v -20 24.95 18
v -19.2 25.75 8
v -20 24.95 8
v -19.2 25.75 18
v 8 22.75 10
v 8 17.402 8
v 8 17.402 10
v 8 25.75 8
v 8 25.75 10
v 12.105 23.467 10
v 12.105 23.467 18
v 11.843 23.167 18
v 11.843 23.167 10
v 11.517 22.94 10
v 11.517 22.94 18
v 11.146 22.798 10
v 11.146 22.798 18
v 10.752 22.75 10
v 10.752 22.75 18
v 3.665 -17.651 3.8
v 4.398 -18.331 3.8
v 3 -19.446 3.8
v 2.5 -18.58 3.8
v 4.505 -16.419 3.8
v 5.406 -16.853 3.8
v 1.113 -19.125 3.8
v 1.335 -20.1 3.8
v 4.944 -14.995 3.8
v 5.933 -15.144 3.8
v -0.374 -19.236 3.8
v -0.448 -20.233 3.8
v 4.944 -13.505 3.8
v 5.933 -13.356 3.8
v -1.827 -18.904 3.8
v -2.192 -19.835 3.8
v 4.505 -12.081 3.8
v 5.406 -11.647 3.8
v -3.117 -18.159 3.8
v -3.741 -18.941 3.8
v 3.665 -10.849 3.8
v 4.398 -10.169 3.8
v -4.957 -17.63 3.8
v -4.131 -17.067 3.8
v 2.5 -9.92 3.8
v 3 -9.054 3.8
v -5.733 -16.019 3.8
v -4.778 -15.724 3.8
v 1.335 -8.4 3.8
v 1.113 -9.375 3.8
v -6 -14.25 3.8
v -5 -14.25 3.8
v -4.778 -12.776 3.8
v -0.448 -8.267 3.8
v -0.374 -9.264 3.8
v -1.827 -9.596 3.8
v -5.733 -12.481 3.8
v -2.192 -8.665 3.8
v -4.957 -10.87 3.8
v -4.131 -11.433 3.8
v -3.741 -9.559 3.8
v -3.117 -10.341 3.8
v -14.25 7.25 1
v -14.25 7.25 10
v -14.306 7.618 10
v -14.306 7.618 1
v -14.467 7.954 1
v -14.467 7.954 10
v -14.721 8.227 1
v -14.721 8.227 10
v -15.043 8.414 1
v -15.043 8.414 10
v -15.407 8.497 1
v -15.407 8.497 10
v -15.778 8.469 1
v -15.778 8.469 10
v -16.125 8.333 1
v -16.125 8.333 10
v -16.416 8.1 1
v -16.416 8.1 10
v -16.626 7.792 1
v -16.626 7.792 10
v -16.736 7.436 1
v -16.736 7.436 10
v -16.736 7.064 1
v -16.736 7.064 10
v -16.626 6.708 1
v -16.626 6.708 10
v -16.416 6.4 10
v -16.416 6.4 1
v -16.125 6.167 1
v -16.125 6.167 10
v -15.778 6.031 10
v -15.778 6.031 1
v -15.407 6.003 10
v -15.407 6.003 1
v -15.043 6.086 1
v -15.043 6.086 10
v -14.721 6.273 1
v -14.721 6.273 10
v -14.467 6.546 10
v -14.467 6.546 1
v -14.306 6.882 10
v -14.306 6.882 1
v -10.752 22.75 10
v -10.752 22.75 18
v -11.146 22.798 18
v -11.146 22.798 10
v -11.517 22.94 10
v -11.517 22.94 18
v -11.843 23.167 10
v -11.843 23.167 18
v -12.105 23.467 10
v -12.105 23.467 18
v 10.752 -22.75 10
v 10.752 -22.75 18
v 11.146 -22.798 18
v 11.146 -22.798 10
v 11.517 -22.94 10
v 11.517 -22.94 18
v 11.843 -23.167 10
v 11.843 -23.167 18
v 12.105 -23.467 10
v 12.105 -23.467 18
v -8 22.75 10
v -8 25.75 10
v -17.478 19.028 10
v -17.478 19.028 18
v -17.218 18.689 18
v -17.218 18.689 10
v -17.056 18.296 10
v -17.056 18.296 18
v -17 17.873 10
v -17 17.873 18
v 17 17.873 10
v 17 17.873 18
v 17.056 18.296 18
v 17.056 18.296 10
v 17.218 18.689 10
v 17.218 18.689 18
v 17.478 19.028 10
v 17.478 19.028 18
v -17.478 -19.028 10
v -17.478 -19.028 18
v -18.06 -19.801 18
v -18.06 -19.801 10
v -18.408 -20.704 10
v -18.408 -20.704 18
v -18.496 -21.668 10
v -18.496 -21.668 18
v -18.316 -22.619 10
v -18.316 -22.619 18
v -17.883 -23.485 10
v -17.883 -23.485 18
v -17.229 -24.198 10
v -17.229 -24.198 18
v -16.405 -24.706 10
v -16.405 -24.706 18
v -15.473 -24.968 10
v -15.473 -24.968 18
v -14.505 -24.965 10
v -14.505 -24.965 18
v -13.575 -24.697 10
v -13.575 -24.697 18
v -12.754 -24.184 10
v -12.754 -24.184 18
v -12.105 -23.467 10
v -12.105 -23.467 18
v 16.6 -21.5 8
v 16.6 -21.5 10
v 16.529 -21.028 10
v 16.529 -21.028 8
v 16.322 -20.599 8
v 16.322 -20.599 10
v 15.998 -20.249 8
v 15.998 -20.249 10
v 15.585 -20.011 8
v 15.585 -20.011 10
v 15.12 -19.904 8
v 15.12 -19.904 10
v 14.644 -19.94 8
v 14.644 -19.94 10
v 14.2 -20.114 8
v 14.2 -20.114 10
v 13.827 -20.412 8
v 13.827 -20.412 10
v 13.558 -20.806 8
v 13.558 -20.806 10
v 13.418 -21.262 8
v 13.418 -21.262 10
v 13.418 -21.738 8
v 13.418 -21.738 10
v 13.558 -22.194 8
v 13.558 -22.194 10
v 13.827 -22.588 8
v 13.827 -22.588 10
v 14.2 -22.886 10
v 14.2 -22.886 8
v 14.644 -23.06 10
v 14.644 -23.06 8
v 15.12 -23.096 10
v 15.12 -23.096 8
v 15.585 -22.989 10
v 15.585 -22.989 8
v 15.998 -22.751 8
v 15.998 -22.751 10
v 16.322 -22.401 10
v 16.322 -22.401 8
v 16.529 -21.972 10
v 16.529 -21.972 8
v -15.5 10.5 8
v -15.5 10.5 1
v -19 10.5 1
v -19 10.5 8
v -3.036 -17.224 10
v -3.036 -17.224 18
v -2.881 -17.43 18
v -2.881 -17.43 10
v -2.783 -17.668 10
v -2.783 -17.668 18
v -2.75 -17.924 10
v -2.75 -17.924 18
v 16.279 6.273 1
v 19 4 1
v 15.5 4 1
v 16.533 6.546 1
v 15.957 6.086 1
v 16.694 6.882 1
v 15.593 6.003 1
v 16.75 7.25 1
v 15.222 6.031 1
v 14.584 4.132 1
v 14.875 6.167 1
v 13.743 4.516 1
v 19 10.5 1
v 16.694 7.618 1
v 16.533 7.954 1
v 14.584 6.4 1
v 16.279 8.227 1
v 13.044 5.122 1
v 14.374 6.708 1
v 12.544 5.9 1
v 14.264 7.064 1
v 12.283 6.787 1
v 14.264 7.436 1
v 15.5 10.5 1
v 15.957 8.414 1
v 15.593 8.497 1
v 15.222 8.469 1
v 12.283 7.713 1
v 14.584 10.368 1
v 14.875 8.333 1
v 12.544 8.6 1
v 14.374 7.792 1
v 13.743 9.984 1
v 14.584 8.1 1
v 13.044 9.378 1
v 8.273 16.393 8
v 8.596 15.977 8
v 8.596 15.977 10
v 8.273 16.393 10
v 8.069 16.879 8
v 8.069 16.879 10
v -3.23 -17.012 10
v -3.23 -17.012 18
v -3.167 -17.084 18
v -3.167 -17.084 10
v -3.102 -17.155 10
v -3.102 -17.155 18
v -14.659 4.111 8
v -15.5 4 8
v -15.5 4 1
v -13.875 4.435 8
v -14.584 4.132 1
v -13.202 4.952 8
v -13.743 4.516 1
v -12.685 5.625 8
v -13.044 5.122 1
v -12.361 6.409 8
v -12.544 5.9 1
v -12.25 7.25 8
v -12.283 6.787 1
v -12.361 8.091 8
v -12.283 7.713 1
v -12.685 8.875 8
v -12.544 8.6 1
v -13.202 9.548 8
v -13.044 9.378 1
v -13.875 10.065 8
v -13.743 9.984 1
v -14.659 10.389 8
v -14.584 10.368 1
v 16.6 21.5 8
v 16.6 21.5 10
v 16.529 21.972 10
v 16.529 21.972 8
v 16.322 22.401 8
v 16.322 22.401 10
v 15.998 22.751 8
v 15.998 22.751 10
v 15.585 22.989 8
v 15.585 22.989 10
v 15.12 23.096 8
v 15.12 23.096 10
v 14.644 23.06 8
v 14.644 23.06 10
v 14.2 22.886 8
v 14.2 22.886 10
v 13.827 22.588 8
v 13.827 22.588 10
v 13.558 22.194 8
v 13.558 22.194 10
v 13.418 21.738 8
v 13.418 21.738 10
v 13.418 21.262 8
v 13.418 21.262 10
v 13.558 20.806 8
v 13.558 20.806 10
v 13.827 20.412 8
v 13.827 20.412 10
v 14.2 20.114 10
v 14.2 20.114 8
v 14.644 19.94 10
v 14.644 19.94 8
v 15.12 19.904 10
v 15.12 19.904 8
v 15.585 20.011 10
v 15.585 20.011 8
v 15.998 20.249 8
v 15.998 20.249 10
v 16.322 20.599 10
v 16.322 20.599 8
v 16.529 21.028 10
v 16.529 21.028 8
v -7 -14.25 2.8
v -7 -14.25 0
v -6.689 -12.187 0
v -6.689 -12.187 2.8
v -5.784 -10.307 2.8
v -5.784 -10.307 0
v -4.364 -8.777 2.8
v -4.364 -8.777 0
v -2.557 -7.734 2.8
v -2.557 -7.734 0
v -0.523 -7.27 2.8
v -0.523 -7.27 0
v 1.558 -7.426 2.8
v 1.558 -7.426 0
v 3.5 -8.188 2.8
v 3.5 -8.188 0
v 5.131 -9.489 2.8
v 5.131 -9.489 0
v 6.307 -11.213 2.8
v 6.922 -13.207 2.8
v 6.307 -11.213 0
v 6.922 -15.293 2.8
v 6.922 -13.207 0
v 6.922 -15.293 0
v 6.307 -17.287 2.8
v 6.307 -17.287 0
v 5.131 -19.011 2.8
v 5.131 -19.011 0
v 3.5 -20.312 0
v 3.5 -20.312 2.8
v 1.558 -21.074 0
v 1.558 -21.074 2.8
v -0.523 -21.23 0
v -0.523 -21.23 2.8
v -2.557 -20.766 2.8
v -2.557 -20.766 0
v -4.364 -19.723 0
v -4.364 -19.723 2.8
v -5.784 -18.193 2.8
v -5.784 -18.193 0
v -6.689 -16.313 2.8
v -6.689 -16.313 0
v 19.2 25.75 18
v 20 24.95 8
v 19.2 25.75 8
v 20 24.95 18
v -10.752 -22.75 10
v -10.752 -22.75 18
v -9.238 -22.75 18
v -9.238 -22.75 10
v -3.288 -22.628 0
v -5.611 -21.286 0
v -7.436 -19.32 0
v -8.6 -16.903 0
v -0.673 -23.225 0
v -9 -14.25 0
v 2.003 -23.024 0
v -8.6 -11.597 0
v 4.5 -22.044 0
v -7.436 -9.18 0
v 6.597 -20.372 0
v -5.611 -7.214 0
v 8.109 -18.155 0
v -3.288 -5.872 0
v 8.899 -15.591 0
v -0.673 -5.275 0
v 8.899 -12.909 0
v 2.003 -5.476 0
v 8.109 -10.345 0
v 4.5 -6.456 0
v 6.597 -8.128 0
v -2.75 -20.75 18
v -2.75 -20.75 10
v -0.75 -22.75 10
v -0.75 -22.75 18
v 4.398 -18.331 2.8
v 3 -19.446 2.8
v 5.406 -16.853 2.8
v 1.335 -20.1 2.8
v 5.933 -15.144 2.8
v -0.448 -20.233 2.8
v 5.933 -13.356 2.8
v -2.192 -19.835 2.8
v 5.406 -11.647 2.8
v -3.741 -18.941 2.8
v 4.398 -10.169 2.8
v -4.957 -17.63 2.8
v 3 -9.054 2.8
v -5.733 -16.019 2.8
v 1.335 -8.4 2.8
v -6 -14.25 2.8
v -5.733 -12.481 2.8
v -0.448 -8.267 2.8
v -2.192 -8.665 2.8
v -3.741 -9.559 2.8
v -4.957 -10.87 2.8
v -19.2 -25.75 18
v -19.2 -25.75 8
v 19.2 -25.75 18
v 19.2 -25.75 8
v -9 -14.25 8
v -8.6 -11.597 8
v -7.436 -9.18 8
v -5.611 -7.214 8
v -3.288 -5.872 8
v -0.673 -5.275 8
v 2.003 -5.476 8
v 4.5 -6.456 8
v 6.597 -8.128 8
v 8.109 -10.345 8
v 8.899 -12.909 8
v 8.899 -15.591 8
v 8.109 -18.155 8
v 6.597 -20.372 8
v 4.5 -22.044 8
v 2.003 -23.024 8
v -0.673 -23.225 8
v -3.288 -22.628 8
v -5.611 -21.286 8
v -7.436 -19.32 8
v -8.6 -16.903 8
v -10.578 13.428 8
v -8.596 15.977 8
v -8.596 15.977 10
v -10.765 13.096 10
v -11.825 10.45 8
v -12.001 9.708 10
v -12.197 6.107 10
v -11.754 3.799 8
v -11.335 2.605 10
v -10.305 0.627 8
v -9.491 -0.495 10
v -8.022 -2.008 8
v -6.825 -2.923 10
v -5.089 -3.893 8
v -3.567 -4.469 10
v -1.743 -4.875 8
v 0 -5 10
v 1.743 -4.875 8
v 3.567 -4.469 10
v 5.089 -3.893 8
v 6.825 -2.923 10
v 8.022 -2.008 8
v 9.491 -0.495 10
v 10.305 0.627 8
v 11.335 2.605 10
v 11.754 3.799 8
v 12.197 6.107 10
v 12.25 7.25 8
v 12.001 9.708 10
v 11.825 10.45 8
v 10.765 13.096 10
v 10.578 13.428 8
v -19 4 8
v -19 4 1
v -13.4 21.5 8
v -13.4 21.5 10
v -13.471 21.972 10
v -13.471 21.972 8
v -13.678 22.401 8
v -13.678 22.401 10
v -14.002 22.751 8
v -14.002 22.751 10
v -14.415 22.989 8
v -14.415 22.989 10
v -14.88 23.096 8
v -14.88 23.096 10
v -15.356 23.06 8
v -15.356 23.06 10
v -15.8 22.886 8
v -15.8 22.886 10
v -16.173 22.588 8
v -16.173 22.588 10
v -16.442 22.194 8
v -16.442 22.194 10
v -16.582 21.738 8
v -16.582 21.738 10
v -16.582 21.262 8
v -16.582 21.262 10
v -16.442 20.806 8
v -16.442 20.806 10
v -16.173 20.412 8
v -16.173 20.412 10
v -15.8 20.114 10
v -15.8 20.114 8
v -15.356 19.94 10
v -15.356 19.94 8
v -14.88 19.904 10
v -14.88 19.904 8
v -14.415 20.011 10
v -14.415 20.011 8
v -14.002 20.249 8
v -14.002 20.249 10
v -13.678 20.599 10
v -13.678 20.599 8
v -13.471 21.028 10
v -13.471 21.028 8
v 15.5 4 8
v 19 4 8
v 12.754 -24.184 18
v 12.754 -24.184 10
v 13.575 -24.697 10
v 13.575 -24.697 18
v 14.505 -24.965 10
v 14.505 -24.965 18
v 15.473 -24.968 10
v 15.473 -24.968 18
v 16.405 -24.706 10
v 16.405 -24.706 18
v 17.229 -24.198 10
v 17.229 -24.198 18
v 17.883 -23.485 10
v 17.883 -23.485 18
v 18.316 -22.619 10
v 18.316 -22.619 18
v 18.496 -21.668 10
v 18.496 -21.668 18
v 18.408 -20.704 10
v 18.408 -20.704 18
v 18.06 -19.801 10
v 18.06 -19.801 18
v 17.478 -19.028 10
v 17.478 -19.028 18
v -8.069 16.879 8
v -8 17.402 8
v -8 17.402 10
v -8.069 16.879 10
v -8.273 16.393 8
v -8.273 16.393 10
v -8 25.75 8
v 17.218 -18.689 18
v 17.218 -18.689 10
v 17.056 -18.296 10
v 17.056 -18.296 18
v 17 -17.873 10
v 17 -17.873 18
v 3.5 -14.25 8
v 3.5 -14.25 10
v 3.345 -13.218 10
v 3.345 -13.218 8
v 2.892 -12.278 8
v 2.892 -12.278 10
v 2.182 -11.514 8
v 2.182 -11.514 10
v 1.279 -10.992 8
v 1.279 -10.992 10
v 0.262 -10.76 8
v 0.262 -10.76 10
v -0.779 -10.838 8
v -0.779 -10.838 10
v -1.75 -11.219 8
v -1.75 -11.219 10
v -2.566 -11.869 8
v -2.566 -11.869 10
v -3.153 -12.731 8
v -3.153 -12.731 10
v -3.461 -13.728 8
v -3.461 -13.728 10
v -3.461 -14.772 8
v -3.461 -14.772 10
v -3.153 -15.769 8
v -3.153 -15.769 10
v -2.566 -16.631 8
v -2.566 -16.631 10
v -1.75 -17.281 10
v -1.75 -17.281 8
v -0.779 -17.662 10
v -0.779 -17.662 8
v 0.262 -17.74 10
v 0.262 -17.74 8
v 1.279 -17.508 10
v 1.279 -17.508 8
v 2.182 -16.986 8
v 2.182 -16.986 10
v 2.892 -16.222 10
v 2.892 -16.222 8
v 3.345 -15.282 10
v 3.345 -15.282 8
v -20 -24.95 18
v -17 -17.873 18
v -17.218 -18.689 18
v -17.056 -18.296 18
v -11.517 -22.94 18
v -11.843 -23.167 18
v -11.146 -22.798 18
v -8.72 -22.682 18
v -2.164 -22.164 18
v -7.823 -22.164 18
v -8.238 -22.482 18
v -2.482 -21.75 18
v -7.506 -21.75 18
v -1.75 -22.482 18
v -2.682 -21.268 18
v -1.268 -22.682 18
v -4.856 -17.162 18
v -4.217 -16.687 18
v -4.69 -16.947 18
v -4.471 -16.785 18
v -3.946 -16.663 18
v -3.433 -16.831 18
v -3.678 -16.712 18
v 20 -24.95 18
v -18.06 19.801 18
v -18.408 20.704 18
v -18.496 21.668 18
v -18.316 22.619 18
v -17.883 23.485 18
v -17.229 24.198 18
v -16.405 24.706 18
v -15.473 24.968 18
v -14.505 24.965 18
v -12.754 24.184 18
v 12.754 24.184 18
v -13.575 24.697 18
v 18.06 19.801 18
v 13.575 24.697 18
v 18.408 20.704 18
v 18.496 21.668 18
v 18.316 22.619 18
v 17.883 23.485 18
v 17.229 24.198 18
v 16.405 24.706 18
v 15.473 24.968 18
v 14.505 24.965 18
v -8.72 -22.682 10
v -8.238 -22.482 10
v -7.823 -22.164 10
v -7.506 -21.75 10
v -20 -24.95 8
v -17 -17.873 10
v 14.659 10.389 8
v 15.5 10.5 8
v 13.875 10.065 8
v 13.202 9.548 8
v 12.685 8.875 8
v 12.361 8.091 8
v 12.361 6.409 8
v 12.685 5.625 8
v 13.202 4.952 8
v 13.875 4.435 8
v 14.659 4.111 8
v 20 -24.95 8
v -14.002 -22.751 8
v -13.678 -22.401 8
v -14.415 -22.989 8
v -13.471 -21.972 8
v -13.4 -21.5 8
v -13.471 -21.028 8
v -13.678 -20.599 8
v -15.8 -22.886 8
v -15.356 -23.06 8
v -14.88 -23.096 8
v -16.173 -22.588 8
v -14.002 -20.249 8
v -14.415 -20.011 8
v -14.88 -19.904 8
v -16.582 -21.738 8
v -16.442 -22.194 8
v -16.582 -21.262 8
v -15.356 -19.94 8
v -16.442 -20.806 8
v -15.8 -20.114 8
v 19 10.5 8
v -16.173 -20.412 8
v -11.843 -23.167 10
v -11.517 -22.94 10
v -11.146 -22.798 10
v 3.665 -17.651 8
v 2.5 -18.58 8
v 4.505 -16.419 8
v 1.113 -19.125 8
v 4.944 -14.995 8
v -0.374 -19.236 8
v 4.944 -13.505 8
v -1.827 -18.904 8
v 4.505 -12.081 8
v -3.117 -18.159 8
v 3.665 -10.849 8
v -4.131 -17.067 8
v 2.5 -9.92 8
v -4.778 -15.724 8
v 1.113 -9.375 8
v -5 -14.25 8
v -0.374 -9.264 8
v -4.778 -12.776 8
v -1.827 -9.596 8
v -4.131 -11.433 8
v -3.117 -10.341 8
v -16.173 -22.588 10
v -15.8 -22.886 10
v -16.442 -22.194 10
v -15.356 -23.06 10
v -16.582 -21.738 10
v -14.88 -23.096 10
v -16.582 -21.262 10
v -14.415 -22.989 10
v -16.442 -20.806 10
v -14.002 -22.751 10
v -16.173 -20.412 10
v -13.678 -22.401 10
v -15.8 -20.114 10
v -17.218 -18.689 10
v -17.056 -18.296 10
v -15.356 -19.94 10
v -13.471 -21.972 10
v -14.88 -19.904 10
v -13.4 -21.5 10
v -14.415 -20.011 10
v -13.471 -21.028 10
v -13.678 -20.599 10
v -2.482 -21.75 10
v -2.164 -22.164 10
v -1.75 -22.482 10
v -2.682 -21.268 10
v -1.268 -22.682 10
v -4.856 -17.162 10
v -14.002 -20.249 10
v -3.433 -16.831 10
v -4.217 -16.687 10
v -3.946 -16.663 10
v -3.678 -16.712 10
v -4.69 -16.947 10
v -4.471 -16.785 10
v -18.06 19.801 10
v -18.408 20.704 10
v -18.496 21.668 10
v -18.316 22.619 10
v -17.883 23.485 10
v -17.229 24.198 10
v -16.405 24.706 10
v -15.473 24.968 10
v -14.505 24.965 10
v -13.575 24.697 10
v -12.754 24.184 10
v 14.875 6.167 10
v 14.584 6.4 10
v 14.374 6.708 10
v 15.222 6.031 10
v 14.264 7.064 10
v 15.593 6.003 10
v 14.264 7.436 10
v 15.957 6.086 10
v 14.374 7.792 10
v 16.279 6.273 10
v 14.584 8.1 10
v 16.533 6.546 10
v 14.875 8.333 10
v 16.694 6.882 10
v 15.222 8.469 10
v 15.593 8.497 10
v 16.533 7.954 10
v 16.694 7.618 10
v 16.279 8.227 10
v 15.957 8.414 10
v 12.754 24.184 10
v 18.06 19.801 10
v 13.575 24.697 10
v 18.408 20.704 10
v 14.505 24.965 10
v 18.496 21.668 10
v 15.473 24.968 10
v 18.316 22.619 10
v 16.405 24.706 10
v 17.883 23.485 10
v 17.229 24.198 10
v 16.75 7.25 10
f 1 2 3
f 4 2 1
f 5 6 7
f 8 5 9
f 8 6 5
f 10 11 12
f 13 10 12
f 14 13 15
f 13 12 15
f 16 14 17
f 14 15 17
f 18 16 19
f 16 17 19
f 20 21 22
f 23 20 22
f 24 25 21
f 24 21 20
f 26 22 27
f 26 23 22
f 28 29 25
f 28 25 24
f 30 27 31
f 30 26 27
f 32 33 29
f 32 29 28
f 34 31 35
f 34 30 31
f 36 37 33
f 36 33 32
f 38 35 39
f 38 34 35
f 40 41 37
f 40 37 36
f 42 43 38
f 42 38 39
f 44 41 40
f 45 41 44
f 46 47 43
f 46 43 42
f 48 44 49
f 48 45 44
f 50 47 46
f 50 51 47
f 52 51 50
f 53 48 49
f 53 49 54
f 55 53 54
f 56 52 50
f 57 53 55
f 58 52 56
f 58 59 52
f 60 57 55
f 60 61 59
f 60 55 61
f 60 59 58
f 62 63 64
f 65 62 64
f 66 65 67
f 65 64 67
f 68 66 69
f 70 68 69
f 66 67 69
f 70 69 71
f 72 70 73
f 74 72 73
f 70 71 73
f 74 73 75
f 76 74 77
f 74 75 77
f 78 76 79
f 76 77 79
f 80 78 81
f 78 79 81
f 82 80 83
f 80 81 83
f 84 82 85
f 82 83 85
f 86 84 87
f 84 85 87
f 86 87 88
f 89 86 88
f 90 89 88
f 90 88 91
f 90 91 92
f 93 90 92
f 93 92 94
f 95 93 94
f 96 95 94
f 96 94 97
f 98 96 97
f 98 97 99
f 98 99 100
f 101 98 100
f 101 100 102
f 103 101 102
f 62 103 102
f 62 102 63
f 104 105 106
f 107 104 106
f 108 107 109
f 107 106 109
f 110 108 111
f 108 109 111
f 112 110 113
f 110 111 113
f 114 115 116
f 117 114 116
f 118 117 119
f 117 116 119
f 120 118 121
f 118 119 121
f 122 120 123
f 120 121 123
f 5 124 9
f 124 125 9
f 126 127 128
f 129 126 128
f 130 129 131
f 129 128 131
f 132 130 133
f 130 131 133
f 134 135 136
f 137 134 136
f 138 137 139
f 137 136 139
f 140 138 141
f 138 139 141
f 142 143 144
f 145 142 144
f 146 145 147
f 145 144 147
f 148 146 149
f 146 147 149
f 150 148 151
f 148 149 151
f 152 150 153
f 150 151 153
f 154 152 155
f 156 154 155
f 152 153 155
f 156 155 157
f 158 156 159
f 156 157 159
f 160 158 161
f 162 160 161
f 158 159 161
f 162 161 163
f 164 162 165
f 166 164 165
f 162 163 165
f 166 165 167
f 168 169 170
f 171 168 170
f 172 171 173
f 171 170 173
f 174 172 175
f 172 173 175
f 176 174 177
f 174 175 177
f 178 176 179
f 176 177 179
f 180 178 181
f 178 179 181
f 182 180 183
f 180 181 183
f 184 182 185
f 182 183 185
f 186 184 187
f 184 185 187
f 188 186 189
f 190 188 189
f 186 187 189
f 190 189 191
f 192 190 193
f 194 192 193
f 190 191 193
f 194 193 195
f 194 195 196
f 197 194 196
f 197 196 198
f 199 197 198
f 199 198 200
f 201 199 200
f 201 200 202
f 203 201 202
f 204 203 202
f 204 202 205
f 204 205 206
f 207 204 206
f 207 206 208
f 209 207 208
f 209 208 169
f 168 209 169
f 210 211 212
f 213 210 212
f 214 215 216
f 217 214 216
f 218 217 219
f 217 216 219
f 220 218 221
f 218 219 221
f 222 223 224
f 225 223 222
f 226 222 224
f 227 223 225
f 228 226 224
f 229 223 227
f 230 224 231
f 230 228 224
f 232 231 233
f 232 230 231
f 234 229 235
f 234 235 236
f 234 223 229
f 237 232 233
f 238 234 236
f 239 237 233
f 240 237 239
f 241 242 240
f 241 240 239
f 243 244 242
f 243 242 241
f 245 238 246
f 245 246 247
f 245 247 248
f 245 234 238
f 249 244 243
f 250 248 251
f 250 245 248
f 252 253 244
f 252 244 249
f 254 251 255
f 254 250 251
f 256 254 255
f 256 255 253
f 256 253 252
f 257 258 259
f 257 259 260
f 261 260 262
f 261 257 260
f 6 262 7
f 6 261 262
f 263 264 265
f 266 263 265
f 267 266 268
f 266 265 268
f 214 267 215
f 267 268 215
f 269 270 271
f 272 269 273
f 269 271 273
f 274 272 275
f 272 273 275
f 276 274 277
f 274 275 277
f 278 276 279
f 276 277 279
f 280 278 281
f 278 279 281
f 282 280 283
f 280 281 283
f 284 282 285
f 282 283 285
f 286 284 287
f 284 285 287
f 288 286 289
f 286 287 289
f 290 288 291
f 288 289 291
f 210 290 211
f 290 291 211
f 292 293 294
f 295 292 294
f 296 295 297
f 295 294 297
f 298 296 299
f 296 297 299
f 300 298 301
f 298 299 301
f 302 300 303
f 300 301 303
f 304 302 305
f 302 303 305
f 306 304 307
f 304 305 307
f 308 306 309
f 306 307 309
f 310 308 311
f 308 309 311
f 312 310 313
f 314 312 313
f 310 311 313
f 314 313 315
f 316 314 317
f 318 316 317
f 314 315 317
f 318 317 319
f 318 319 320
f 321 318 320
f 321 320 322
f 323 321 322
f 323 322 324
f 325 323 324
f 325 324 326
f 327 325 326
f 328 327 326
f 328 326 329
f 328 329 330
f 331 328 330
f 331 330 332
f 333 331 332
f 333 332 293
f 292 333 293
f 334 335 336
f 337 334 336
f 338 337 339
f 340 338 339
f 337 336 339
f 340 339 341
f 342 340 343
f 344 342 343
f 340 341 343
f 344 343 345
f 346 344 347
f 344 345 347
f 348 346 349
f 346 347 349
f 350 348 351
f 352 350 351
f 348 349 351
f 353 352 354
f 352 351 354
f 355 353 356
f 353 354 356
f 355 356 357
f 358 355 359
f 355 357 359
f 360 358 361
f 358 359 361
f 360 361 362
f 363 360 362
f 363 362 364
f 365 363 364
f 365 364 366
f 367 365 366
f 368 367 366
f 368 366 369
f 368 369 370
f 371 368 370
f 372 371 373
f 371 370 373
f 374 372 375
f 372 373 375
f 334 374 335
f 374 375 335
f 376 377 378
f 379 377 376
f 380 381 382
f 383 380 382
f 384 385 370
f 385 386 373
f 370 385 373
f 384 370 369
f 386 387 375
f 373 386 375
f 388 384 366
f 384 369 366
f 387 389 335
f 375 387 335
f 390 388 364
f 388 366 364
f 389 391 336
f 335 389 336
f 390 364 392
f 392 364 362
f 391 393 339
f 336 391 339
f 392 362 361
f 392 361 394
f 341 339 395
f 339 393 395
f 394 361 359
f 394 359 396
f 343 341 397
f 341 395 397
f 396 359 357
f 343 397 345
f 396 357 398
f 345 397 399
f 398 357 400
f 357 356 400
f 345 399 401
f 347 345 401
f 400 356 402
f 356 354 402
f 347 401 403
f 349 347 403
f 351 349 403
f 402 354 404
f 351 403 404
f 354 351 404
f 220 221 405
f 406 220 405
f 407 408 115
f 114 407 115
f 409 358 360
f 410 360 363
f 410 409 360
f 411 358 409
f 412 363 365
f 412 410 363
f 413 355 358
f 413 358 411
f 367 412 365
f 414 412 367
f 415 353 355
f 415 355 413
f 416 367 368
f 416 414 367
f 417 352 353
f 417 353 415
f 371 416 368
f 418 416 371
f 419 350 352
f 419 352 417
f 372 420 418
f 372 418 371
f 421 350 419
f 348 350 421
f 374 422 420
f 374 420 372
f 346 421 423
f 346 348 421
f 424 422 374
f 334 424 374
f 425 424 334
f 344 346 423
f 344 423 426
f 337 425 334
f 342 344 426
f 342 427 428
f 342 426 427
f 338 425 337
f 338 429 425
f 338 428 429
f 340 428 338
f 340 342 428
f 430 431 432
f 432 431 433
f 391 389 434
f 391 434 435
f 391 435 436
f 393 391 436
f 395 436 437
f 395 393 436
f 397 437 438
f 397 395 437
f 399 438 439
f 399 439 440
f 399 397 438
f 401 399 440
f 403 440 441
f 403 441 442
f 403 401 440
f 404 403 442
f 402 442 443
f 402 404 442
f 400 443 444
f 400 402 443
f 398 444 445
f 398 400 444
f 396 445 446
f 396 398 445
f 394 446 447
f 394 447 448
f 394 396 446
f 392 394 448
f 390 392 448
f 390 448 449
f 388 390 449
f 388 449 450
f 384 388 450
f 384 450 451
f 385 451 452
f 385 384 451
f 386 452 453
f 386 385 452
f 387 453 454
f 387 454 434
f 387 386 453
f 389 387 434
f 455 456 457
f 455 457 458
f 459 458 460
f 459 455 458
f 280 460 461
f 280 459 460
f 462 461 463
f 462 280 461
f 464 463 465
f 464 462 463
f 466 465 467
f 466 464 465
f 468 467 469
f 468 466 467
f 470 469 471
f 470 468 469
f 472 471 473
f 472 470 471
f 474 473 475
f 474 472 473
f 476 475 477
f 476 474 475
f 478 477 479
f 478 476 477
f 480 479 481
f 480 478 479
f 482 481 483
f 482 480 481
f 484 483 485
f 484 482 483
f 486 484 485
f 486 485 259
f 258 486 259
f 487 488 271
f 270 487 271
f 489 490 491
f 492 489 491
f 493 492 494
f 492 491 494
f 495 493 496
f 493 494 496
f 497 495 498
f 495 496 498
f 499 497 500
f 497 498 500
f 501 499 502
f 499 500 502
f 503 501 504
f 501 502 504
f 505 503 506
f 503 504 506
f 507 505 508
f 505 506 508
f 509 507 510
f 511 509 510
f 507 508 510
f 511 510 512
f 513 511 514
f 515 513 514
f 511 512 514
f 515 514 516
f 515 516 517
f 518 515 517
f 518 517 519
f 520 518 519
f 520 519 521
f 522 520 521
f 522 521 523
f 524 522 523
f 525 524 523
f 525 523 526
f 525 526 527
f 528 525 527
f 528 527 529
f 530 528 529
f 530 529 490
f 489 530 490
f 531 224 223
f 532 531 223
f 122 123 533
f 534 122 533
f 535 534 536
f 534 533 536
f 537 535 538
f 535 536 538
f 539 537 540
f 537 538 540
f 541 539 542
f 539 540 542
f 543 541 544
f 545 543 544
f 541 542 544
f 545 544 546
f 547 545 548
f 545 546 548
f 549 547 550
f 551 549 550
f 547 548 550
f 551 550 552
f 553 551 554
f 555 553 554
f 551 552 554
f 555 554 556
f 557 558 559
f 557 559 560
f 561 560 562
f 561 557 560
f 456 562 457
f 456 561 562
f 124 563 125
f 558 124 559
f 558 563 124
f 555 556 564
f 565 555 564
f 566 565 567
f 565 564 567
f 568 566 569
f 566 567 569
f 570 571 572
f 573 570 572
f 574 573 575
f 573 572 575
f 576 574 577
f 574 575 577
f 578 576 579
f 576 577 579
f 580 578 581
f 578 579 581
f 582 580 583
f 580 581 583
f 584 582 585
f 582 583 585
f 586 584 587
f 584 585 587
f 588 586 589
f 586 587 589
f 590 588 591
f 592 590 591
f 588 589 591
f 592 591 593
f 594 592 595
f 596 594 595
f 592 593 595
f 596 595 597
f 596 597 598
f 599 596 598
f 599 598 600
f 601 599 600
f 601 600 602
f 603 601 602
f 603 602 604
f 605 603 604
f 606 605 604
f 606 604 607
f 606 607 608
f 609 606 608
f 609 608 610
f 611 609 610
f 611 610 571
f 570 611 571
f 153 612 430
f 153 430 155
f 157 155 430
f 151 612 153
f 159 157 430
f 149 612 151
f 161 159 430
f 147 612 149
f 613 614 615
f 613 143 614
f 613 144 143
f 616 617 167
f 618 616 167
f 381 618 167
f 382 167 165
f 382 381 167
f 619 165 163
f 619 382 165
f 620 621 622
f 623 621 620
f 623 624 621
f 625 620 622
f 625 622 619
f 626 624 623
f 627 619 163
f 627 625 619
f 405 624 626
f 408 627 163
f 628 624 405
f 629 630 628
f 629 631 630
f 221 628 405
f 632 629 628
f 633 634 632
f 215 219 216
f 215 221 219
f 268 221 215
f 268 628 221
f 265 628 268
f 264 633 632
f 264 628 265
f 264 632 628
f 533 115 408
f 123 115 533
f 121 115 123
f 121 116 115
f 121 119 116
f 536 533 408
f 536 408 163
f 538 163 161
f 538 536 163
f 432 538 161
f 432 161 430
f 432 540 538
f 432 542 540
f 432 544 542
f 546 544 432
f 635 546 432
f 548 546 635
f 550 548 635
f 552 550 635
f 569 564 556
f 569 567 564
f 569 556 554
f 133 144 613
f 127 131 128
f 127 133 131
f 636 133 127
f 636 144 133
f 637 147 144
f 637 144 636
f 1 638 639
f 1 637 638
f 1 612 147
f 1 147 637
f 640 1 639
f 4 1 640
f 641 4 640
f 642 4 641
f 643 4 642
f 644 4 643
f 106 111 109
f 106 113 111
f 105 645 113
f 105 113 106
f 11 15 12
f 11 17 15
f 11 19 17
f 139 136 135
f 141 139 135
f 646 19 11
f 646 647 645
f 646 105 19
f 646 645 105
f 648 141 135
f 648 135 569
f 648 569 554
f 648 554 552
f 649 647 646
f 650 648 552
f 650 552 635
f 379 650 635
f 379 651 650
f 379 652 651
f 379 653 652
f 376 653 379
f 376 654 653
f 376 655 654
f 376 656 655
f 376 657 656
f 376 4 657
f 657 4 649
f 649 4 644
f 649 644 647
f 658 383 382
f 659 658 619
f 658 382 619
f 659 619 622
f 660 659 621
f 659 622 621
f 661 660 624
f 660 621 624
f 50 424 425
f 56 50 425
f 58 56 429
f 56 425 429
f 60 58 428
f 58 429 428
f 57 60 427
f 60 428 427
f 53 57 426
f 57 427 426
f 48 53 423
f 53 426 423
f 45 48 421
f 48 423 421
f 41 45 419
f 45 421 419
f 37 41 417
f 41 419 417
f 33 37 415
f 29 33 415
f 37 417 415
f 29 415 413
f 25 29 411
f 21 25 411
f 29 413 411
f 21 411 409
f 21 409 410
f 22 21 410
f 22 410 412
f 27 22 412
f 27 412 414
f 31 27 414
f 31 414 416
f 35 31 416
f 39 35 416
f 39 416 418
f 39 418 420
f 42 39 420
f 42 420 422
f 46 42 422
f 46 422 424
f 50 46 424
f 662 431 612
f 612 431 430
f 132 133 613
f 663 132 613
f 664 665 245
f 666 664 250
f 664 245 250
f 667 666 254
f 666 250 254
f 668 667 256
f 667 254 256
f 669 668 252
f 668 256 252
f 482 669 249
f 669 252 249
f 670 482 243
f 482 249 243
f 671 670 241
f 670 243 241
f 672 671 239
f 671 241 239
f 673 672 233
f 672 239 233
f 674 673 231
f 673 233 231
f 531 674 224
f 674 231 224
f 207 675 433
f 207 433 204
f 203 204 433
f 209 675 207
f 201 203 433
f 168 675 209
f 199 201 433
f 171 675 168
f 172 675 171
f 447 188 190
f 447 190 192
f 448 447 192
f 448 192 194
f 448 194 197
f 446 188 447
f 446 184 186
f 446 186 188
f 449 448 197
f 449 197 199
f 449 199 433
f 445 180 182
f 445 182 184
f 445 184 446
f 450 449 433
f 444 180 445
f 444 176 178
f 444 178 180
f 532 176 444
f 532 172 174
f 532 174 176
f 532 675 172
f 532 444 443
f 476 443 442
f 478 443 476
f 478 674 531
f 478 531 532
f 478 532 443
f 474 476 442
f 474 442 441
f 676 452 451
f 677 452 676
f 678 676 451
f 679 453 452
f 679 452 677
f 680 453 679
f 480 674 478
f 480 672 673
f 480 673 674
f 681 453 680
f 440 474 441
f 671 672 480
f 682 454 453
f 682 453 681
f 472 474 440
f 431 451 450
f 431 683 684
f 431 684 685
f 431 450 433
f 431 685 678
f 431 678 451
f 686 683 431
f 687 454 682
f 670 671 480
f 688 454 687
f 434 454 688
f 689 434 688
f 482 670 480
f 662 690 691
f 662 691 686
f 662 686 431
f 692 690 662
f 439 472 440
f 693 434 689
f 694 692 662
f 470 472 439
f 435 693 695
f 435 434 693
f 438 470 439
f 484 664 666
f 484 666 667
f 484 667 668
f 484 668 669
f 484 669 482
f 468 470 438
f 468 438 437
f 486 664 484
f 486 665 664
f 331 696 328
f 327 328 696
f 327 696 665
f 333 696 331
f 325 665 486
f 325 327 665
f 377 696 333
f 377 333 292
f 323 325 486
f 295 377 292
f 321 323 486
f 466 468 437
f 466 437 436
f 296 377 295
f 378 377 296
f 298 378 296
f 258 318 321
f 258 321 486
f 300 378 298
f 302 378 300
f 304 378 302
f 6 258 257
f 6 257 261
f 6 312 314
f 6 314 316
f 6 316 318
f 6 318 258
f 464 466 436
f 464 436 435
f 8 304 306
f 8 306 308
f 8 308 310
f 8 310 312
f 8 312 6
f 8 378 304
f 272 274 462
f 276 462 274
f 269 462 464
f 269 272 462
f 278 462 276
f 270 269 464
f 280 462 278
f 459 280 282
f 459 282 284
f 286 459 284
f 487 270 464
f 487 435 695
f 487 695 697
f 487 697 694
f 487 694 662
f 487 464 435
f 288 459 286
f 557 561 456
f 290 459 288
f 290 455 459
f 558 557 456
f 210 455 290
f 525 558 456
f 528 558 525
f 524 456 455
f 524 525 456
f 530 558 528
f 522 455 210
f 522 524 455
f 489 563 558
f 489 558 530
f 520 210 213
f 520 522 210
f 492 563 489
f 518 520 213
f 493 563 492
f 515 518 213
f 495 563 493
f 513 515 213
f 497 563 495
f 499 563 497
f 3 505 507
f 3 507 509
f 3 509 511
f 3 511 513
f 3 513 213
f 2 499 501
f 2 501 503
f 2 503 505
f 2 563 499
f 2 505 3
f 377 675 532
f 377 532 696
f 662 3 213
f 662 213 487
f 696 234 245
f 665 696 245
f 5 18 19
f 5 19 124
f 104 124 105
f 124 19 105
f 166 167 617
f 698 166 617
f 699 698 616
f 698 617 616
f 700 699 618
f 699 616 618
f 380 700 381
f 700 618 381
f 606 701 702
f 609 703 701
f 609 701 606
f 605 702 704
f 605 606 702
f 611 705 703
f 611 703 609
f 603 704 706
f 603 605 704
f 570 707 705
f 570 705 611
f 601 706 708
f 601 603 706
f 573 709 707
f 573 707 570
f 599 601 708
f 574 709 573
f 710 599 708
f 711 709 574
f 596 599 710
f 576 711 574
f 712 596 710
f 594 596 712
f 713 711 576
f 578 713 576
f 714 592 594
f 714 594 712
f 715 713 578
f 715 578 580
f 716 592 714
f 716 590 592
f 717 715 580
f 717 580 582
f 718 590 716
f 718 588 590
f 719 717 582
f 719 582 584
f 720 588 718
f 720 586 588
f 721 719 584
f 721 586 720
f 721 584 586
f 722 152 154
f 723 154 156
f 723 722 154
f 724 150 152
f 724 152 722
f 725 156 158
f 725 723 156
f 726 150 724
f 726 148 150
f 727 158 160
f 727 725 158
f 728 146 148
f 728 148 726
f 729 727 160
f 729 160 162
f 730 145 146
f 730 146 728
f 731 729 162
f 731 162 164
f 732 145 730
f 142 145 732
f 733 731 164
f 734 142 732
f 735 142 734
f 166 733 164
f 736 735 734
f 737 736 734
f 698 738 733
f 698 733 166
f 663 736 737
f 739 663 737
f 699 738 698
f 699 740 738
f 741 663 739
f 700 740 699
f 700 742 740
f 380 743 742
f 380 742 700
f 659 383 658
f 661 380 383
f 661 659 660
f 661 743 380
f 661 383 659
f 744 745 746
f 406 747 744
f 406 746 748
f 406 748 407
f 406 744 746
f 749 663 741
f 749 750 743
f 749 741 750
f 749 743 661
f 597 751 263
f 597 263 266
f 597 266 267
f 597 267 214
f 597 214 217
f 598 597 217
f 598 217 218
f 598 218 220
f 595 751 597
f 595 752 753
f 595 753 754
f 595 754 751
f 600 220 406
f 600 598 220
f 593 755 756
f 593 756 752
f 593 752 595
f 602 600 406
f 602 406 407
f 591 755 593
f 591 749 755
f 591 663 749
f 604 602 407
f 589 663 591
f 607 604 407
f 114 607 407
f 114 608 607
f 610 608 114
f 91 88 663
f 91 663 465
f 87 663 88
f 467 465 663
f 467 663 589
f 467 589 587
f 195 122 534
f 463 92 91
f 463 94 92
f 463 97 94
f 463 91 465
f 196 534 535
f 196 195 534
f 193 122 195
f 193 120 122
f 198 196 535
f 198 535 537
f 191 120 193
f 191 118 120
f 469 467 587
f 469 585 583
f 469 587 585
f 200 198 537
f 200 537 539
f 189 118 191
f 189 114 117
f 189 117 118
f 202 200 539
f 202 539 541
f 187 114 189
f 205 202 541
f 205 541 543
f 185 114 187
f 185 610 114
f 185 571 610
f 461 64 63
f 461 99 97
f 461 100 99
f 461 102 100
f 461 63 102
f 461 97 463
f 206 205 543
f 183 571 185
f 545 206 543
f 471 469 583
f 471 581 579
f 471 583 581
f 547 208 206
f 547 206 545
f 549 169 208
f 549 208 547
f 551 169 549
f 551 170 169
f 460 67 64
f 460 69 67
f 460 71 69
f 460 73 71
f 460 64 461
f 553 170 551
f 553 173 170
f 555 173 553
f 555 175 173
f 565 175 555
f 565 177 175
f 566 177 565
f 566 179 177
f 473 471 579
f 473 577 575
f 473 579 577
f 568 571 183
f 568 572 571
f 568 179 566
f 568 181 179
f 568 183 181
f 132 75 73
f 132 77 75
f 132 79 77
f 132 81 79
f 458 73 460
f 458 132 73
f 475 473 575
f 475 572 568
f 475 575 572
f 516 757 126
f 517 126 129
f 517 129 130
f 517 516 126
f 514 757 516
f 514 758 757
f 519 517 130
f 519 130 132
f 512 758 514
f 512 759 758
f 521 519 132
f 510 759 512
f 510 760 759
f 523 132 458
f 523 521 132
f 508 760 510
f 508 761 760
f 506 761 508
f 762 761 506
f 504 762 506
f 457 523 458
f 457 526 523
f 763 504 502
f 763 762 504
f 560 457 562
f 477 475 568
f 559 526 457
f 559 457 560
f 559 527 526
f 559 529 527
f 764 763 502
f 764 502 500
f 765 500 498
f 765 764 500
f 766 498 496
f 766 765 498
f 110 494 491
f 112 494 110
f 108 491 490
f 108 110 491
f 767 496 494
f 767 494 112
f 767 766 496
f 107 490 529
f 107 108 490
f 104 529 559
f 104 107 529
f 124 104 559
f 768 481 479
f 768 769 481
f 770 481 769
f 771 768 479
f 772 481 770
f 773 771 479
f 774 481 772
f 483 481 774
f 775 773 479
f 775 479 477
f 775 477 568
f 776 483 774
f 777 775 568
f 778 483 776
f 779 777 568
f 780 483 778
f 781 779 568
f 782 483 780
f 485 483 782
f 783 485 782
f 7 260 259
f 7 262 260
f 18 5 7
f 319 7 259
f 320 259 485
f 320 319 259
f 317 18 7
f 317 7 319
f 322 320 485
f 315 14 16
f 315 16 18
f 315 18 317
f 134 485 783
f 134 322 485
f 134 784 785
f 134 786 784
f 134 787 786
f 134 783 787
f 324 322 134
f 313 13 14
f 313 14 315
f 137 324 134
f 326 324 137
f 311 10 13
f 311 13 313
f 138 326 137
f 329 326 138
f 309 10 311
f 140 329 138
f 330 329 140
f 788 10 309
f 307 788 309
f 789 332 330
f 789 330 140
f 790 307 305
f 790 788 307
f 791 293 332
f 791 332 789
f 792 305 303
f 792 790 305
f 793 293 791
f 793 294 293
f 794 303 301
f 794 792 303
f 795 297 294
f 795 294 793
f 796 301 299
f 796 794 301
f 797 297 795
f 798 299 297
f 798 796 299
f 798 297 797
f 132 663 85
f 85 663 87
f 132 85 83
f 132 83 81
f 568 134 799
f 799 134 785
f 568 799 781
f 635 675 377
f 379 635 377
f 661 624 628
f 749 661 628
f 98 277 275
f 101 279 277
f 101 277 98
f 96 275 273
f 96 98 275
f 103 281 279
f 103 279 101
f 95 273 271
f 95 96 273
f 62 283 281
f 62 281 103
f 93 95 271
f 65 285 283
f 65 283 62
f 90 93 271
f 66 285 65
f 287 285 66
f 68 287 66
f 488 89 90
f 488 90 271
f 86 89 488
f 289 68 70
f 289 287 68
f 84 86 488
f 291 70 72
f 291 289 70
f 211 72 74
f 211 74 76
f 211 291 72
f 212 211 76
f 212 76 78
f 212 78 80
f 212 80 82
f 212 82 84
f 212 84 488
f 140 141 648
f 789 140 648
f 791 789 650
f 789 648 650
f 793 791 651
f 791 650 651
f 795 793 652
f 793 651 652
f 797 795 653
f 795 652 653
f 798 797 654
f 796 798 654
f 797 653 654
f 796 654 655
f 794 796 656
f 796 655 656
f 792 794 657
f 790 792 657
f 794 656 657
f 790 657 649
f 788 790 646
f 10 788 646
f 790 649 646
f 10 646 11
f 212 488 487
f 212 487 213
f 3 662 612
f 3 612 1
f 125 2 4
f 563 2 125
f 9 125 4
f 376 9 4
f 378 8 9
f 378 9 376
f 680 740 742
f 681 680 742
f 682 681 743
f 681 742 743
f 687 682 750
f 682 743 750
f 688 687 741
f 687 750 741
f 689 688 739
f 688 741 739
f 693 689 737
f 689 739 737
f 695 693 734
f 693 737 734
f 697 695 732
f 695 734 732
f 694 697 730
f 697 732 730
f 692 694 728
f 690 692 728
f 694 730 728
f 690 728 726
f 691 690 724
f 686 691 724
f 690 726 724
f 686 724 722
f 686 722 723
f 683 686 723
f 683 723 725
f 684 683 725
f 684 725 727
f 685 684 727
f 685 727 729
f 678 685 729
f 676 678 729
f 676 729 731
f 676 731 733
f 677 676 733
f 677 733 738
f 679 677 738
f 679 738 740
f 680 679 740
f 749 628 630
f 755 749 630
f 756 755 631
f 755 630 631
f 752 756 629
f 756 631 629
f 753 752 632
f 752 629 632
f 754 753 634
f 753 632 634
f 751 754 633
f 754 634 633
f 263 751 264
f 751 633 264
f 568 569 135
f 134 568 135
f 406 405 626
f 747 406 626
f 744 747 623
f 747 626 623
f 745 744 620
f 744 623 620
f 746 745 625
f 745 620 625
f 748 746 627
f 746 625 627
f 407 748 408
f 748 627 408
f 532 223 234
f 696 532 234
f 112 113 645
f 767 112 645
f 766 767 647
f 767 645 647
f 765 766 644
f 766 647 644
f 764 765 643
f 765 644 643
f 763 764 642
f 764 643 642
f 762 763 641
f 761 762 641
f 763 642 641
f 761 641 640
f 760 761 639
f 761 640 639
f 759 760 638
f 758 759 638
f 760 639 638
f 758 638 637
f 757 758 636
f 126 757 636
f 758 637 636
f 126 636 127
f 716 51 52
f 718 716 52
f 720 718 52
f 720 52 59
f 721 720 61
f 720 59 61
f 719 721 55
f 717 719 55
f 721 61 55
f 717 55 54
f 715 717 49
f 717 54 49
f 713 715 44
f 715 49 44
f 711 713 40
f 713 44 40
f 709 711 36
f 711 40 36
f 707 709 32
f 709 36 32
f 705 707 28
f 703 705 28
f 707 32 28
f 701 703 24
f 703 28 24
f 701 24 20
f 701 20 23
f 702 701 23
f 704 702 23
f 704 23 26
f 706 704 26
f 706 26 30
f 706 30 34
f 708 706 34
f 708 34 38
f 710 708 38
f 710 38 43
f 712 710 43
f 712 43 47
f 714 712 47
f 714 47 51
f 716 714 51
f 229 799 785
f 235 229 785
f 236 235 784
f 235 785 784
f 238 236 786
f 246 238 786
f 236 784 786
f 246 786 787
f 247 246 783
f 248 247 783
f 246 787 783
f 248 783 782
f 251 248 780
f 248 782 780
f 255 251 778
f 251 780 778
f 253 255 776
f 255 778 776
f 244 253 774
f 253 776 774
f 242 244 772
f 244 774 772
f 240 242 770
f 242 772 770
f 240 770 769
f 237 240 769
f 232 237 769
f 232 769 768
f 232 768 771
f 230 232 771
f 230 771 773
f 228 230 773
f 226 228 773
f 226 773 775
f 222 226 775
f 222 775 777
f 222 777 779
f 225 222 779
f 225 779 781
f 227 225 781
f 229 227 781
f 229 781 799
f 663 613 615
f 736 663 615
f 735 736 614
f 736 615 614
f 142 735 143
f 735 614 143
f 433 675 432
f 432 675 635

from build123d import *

# Parameters (mm, degrees)
SKETCH1_W             = 40
SKETCH1_H             = 51.5
BOSS_EXTRUDE1_DEPTH   = 18
SKETCH3_R             = 1.6
CUT_EXTRUDE1_DEPTH    = 19
SKETCH4_R             = 3.5
CUT_EXTRUDE2_DEPTH    = 18
CUT_EXTRUDE3_DEPTH    = 8
SKETCH6_R             = 9
CUT_EXTRUDE4_DEPTH    = 8
SKETCH7_R             = 7
CUT_EXTRUDE5_DEPTH    = 2.8
SKETCH8_R             = 6
CUT_EXTRUDE6_DEPTH    = 3.8
SKETCH9_R             = 5
CUT_EXTRUDE7_DEPTH    = 8
M3X0_5_TAPPED_HOLE1_D = 2.5
CUT_EXTRUDE8_DEPTH    = 2
CUT_EXTRUDE9_DEPTH    = 1
CHAMFER1_SIZE         = 0.8
SKETCH14_W            = 1
SKETCH14_H            = 6.5
CUT_EXTRUDE10_DEPTH   = 7


with BuildPart() as part:
    # Sketch1 → Boss-Extrude1 (new body)
    with BuildSketch(Plane.XY):
        Rectangle(SKETCH1_W, SKETCH1_H)
    extrude(amount=BOSS_EXTRUDE1_DEPTH)

    # Sketch3 → Cut-Extrude1 (cut, through all)
    with BuildSketch(Plane.XY.offset(18)):
        with Locations((-15, 21.5)):
            Circle(SKETCH3_R)
        with Locations((-15, -21.5)):
            Circle(SKETCH3_R)
        with Locations((15, 21.5)):
            Circle(SKETCH3_R)
        with Locations((15, -21.5)):
            Circle(SKETCH3_R)
    extrude(amount=-CUT_EXTRUDE1_DEPTH, mode=Mode.SUBTRACT)

    # Sketch4 → Cut-Extrude2 (cut)
    with BuildSketch(Plane.XY.offset(18)):
        with Locations((0, -14.25)):
            Circle(SKETCH4_R)
    extrude(amount=-CUT_EXTRUDE2_DEPTH, mode=Mode.SUBTRACT)

    # Sketch5 → Cut-Extrude3 (cut)
    with BuildSketch(Plane.XY.offset(18)):
        with BuildLine():
            Line((-17, 17.872848693), (-17, -17.872848693))
            ThreePointArc((-17, -17.872848693), (-17.124132538, -18.49783351), (-17.477686074, -19.027941805))
            ThreePointArc((-17.477686074, -19.027941805), (-17.229095042, -24.198357888), (-12.104699799, -23.466529111))
            ThreePointArc((-12.104699799, -23.466529111), (-11.517289712, -22.940191537), (-10.751842764, -22.75))
            Line((-10.751842764, -22.75), (-9.2376, -22.75))
            ThreePointArc((-9.2376, -22.75), (-8.237593216, -22.482046891), (-7.50554136, -21.749986433))
            Line((-7.50554136, -21.749986433), (-4.85642932, -17.161506784))
            ThreePointArc((-4.85642932, -17.161506784), (-4.082002001, -16.665704301), (-3.230119897, -17.011904614))
            ThreePointArc((-3.230119897, -17.011904614), (-3.134851007, -17.11961684), (-3.035950666, -17.224004614))
            ThreePointArc((-3.035950666, -17.224004614), (-2.824243732, -17.545979208), (-2.75, -17.9241))
            Line((-2.75, -17.9241), (-2.75, -20.75))
            ThreePointArc((-2.75, -20.75), (-2.164213562, -22.164213562), (-0.75, -22.75))
            Line((-0.75, -22.75), (10.751842764, -22.75))
            ThreePointArc((10.751842764, -22.75), (11.517289712, -22.940191537), (12.104699799, -23.466529111))
            ThreePointArc((12.104699799, -23.466529111), (17.229095042, -24.198357888), (17.477686074, -19.027941805))
            ThreePointArc((17.477686074, -19.027941805), (17.124132538, -18.49783351), (17, -17.872848693))
            Line((17, -17.872848693), (17, 17.872848693))
            ThreePointArc((17, 17.872848693), (17.124132538, 18.49783351), (17.477686074, 19.027941805))
            ThreePointArc((17.477686074, 19.027941805), (17.229095042, 24.198357888), (12.104699799, 23.466529111))
            ThreePointArc((12.104699799, 23.466529111), (11.517289712, 22.940191537), (10.751842764, 22.75))
            Line((10.751842764, 22.75), (-10.751842764, 22.75))
            ThreePointArc((-10.751842764, 22.75), (-11.517289712, 22.940191537), (-12.104699799, 23.466529111))
            ThreePointArc((-12.104699799, 23.466529111), (-17.229095042, 24.198357888), (-17.477686074, 19.027941805))
            ThreePointArc((-17.477686074, 19.027941805), (-17.124132538, 18.49783351), (-17, 17.872848693))
        make_face()
    extrude(amount=-CUT_EXTRUDE3_DEPTH, mode=Mode.SUBTRACT)

    # Sketch6 → Cut-Extrude4 (cut)
    with BuildSketch(Plane(origin=(0, 0, 0), x_dir=(-1, 0, 0), z_dir=(0, 0, -1))):
        with BuildLine():
            Line((-20, 10.5), (-15.5, 10.5))
            ThreePointArc((-15.5, 10.5), (-12.25, 7.25), (-15.5, 4))
            Line((-15.5, 4), (-20, 4))
            Line((-20, 4), (-20, -25.75))
            Line((-20, -25.75), (20, -25.75))
            Line((20, -25.75), (20, 4))
            Line((20, 4), (15.5, 4))
            ThreePointArc((15.5, 4), (12.25, 7.25), (15.5, 10.5))
            Line((15.5, 10.5), (20, 10.5))
            Line((20, 10.5), (20, 25.75))
            Line((20, 25.75), (-20, 25.75))
            Line((-20, 25.75), (-20, 10.5))
        make_face()
        with Locations((0, -14.25)):
            Circle(SKETCH6_R, mode=Mode.SUBTRACT)
    extrude(amount=-CUT_EXTRUDE4_DEPTH, mode=Mode.SUBTRACT)

    # Sketch7 → Cut-Extrude5 (cut)
    with BuildSketch(Plane(origin=(0, 0, 0), x_dir=(-1, 0, 0), z_dir=(0, 0, -1))):
        with Locations((0, -14.25)):
            Circle(SKETCH7_R)
    extrude(amount=-CUT_EXTRUDE5_DEPTH, mode=Mode.SUBTRACT)

    # Sketch8 → Cut-Extrude6 (cut)
    with BuildSketch(Plane(origin=(0, 0, 0), x_dir=(-1, 0, 0), z_dir=(0, 0, -1))):
        with Locations((0, -14.25)):
            Circle(SKETCH8_R)
    extrude(amount=-CUT_EXTRUDE6_DEPTH, mode=Mode.SUBTRACT)

    # Sketch9 → Cut-Extrude7 (cut)
    with BuildSketch(Plane(origin=(0, 0, 0), x_dir=(-1, 0, 0), z_dir=(0, 0, -1))):
        with Locations((0, -14.25)):
            Circle(SKETCH9_R)
    extrude(amount=-CUT_EXTRUDE7_DEPTH, mode=Mode.SUBTRACT)

    # M3x0.5 Tapped Hole1 (through all)
    with Locations(Plane(origin=(0, 0, 0), x_dir=(-1, 0, 0), z_dir=(0, 0, -1))):
        with Locations((-15.5, 7.25), (15.5, 7.25)):
            Hole(M3X0_5_TAPPED_HOLE1_D / 2)

    # Sketch12 → Cut-Extrude8 (cut)
    with BuildSketch(Plane(origin=(0, 0, 8), x_dir=(-1, 0, 0), z_dir=(0, 0, -1))):
        with BuildLine():
            Line((-8, 17.401970252), (-8, 25.75))
            Line((-8, 25.75), (8, 25.75))
            Line((8, 25.75), (8, 17.401970252))
            ThreePointArc((8, 17.401970252), (8.155139905, 16.629641806), (8.596491228, 15.977132322))
            ThreePointArc((8.596491228, 15.977132322), (0, -5), (-8.596491228, 15.977132322))
            ThreePointArc((-8.596491228, 15.977132322), (-8.155139905, 16.629641806), (-8, 17.401970252))
        make_face()
    extrude(amount=-CUT_EXTRUDE8_DEPTH, mode=Mode.SUBTRACT)

    # Sketch13 → Cut-Extrude9 (cut)
    with BuildSketch(Plane(origin=(0, 0, 0), x_dir=(-1, 0, 0), z_dir=(0, 0, -1))):
        with BuildLine():
            Line((-20, 10.5), (-20, 4))
            Line((-20, 4), (-15.5, 4))
            ThreePointArc((-15.5, 4), (-12.25, 7.25), (-15.5, 10.5))
            Line((-15.5, 10.5), (-20, 10.5))
        make_face()
        with BuildLine():
            Line((20, 4), (20, 10.5))
            Line((20, 10.5), (15.5, 10.5))
            ThreePointArc((15.5, 10.5), (12.25, 7.25), (15.5, 4))
            Line((15.5, 4), (20, 4))
        make_face()
    extrude(amount=-CUT_EXTRUDE9_DEPTH, mode=Mode.SUBTRACT)

    # Chamfer1
    chamfer1_edges = [part.edges().sort_by_distance(p)[0] for p in [
        (20, -25.75, 13),
        (-20, -25.75, 13),
        (-20, 25.75, 13),
        (20, 25.75, 13),
    ]]
    chamfer(chamfer1_edges, length=CHAMFER1_SIZE)

    # Sketch14 → Cut-Extrude10 (cut)
    with BuildSketch(Plane(origin=(0, 0, 1), x_dir=(-1, 0, 0), z_dir=(0, 0, -1))):
        with Locations((-19.5, 7.25)):
            Rectangle(SKETCH14_W, SKETCH14_H)
        with Locations((19.5, 7.25)):
            Rectangle(SKETCH14_W, SKETCH14_H)
    extrude(amount=-CUT_EXTRUDE10_DEPTH, mode=Mode.SUBTRACT)


solid = part.part
